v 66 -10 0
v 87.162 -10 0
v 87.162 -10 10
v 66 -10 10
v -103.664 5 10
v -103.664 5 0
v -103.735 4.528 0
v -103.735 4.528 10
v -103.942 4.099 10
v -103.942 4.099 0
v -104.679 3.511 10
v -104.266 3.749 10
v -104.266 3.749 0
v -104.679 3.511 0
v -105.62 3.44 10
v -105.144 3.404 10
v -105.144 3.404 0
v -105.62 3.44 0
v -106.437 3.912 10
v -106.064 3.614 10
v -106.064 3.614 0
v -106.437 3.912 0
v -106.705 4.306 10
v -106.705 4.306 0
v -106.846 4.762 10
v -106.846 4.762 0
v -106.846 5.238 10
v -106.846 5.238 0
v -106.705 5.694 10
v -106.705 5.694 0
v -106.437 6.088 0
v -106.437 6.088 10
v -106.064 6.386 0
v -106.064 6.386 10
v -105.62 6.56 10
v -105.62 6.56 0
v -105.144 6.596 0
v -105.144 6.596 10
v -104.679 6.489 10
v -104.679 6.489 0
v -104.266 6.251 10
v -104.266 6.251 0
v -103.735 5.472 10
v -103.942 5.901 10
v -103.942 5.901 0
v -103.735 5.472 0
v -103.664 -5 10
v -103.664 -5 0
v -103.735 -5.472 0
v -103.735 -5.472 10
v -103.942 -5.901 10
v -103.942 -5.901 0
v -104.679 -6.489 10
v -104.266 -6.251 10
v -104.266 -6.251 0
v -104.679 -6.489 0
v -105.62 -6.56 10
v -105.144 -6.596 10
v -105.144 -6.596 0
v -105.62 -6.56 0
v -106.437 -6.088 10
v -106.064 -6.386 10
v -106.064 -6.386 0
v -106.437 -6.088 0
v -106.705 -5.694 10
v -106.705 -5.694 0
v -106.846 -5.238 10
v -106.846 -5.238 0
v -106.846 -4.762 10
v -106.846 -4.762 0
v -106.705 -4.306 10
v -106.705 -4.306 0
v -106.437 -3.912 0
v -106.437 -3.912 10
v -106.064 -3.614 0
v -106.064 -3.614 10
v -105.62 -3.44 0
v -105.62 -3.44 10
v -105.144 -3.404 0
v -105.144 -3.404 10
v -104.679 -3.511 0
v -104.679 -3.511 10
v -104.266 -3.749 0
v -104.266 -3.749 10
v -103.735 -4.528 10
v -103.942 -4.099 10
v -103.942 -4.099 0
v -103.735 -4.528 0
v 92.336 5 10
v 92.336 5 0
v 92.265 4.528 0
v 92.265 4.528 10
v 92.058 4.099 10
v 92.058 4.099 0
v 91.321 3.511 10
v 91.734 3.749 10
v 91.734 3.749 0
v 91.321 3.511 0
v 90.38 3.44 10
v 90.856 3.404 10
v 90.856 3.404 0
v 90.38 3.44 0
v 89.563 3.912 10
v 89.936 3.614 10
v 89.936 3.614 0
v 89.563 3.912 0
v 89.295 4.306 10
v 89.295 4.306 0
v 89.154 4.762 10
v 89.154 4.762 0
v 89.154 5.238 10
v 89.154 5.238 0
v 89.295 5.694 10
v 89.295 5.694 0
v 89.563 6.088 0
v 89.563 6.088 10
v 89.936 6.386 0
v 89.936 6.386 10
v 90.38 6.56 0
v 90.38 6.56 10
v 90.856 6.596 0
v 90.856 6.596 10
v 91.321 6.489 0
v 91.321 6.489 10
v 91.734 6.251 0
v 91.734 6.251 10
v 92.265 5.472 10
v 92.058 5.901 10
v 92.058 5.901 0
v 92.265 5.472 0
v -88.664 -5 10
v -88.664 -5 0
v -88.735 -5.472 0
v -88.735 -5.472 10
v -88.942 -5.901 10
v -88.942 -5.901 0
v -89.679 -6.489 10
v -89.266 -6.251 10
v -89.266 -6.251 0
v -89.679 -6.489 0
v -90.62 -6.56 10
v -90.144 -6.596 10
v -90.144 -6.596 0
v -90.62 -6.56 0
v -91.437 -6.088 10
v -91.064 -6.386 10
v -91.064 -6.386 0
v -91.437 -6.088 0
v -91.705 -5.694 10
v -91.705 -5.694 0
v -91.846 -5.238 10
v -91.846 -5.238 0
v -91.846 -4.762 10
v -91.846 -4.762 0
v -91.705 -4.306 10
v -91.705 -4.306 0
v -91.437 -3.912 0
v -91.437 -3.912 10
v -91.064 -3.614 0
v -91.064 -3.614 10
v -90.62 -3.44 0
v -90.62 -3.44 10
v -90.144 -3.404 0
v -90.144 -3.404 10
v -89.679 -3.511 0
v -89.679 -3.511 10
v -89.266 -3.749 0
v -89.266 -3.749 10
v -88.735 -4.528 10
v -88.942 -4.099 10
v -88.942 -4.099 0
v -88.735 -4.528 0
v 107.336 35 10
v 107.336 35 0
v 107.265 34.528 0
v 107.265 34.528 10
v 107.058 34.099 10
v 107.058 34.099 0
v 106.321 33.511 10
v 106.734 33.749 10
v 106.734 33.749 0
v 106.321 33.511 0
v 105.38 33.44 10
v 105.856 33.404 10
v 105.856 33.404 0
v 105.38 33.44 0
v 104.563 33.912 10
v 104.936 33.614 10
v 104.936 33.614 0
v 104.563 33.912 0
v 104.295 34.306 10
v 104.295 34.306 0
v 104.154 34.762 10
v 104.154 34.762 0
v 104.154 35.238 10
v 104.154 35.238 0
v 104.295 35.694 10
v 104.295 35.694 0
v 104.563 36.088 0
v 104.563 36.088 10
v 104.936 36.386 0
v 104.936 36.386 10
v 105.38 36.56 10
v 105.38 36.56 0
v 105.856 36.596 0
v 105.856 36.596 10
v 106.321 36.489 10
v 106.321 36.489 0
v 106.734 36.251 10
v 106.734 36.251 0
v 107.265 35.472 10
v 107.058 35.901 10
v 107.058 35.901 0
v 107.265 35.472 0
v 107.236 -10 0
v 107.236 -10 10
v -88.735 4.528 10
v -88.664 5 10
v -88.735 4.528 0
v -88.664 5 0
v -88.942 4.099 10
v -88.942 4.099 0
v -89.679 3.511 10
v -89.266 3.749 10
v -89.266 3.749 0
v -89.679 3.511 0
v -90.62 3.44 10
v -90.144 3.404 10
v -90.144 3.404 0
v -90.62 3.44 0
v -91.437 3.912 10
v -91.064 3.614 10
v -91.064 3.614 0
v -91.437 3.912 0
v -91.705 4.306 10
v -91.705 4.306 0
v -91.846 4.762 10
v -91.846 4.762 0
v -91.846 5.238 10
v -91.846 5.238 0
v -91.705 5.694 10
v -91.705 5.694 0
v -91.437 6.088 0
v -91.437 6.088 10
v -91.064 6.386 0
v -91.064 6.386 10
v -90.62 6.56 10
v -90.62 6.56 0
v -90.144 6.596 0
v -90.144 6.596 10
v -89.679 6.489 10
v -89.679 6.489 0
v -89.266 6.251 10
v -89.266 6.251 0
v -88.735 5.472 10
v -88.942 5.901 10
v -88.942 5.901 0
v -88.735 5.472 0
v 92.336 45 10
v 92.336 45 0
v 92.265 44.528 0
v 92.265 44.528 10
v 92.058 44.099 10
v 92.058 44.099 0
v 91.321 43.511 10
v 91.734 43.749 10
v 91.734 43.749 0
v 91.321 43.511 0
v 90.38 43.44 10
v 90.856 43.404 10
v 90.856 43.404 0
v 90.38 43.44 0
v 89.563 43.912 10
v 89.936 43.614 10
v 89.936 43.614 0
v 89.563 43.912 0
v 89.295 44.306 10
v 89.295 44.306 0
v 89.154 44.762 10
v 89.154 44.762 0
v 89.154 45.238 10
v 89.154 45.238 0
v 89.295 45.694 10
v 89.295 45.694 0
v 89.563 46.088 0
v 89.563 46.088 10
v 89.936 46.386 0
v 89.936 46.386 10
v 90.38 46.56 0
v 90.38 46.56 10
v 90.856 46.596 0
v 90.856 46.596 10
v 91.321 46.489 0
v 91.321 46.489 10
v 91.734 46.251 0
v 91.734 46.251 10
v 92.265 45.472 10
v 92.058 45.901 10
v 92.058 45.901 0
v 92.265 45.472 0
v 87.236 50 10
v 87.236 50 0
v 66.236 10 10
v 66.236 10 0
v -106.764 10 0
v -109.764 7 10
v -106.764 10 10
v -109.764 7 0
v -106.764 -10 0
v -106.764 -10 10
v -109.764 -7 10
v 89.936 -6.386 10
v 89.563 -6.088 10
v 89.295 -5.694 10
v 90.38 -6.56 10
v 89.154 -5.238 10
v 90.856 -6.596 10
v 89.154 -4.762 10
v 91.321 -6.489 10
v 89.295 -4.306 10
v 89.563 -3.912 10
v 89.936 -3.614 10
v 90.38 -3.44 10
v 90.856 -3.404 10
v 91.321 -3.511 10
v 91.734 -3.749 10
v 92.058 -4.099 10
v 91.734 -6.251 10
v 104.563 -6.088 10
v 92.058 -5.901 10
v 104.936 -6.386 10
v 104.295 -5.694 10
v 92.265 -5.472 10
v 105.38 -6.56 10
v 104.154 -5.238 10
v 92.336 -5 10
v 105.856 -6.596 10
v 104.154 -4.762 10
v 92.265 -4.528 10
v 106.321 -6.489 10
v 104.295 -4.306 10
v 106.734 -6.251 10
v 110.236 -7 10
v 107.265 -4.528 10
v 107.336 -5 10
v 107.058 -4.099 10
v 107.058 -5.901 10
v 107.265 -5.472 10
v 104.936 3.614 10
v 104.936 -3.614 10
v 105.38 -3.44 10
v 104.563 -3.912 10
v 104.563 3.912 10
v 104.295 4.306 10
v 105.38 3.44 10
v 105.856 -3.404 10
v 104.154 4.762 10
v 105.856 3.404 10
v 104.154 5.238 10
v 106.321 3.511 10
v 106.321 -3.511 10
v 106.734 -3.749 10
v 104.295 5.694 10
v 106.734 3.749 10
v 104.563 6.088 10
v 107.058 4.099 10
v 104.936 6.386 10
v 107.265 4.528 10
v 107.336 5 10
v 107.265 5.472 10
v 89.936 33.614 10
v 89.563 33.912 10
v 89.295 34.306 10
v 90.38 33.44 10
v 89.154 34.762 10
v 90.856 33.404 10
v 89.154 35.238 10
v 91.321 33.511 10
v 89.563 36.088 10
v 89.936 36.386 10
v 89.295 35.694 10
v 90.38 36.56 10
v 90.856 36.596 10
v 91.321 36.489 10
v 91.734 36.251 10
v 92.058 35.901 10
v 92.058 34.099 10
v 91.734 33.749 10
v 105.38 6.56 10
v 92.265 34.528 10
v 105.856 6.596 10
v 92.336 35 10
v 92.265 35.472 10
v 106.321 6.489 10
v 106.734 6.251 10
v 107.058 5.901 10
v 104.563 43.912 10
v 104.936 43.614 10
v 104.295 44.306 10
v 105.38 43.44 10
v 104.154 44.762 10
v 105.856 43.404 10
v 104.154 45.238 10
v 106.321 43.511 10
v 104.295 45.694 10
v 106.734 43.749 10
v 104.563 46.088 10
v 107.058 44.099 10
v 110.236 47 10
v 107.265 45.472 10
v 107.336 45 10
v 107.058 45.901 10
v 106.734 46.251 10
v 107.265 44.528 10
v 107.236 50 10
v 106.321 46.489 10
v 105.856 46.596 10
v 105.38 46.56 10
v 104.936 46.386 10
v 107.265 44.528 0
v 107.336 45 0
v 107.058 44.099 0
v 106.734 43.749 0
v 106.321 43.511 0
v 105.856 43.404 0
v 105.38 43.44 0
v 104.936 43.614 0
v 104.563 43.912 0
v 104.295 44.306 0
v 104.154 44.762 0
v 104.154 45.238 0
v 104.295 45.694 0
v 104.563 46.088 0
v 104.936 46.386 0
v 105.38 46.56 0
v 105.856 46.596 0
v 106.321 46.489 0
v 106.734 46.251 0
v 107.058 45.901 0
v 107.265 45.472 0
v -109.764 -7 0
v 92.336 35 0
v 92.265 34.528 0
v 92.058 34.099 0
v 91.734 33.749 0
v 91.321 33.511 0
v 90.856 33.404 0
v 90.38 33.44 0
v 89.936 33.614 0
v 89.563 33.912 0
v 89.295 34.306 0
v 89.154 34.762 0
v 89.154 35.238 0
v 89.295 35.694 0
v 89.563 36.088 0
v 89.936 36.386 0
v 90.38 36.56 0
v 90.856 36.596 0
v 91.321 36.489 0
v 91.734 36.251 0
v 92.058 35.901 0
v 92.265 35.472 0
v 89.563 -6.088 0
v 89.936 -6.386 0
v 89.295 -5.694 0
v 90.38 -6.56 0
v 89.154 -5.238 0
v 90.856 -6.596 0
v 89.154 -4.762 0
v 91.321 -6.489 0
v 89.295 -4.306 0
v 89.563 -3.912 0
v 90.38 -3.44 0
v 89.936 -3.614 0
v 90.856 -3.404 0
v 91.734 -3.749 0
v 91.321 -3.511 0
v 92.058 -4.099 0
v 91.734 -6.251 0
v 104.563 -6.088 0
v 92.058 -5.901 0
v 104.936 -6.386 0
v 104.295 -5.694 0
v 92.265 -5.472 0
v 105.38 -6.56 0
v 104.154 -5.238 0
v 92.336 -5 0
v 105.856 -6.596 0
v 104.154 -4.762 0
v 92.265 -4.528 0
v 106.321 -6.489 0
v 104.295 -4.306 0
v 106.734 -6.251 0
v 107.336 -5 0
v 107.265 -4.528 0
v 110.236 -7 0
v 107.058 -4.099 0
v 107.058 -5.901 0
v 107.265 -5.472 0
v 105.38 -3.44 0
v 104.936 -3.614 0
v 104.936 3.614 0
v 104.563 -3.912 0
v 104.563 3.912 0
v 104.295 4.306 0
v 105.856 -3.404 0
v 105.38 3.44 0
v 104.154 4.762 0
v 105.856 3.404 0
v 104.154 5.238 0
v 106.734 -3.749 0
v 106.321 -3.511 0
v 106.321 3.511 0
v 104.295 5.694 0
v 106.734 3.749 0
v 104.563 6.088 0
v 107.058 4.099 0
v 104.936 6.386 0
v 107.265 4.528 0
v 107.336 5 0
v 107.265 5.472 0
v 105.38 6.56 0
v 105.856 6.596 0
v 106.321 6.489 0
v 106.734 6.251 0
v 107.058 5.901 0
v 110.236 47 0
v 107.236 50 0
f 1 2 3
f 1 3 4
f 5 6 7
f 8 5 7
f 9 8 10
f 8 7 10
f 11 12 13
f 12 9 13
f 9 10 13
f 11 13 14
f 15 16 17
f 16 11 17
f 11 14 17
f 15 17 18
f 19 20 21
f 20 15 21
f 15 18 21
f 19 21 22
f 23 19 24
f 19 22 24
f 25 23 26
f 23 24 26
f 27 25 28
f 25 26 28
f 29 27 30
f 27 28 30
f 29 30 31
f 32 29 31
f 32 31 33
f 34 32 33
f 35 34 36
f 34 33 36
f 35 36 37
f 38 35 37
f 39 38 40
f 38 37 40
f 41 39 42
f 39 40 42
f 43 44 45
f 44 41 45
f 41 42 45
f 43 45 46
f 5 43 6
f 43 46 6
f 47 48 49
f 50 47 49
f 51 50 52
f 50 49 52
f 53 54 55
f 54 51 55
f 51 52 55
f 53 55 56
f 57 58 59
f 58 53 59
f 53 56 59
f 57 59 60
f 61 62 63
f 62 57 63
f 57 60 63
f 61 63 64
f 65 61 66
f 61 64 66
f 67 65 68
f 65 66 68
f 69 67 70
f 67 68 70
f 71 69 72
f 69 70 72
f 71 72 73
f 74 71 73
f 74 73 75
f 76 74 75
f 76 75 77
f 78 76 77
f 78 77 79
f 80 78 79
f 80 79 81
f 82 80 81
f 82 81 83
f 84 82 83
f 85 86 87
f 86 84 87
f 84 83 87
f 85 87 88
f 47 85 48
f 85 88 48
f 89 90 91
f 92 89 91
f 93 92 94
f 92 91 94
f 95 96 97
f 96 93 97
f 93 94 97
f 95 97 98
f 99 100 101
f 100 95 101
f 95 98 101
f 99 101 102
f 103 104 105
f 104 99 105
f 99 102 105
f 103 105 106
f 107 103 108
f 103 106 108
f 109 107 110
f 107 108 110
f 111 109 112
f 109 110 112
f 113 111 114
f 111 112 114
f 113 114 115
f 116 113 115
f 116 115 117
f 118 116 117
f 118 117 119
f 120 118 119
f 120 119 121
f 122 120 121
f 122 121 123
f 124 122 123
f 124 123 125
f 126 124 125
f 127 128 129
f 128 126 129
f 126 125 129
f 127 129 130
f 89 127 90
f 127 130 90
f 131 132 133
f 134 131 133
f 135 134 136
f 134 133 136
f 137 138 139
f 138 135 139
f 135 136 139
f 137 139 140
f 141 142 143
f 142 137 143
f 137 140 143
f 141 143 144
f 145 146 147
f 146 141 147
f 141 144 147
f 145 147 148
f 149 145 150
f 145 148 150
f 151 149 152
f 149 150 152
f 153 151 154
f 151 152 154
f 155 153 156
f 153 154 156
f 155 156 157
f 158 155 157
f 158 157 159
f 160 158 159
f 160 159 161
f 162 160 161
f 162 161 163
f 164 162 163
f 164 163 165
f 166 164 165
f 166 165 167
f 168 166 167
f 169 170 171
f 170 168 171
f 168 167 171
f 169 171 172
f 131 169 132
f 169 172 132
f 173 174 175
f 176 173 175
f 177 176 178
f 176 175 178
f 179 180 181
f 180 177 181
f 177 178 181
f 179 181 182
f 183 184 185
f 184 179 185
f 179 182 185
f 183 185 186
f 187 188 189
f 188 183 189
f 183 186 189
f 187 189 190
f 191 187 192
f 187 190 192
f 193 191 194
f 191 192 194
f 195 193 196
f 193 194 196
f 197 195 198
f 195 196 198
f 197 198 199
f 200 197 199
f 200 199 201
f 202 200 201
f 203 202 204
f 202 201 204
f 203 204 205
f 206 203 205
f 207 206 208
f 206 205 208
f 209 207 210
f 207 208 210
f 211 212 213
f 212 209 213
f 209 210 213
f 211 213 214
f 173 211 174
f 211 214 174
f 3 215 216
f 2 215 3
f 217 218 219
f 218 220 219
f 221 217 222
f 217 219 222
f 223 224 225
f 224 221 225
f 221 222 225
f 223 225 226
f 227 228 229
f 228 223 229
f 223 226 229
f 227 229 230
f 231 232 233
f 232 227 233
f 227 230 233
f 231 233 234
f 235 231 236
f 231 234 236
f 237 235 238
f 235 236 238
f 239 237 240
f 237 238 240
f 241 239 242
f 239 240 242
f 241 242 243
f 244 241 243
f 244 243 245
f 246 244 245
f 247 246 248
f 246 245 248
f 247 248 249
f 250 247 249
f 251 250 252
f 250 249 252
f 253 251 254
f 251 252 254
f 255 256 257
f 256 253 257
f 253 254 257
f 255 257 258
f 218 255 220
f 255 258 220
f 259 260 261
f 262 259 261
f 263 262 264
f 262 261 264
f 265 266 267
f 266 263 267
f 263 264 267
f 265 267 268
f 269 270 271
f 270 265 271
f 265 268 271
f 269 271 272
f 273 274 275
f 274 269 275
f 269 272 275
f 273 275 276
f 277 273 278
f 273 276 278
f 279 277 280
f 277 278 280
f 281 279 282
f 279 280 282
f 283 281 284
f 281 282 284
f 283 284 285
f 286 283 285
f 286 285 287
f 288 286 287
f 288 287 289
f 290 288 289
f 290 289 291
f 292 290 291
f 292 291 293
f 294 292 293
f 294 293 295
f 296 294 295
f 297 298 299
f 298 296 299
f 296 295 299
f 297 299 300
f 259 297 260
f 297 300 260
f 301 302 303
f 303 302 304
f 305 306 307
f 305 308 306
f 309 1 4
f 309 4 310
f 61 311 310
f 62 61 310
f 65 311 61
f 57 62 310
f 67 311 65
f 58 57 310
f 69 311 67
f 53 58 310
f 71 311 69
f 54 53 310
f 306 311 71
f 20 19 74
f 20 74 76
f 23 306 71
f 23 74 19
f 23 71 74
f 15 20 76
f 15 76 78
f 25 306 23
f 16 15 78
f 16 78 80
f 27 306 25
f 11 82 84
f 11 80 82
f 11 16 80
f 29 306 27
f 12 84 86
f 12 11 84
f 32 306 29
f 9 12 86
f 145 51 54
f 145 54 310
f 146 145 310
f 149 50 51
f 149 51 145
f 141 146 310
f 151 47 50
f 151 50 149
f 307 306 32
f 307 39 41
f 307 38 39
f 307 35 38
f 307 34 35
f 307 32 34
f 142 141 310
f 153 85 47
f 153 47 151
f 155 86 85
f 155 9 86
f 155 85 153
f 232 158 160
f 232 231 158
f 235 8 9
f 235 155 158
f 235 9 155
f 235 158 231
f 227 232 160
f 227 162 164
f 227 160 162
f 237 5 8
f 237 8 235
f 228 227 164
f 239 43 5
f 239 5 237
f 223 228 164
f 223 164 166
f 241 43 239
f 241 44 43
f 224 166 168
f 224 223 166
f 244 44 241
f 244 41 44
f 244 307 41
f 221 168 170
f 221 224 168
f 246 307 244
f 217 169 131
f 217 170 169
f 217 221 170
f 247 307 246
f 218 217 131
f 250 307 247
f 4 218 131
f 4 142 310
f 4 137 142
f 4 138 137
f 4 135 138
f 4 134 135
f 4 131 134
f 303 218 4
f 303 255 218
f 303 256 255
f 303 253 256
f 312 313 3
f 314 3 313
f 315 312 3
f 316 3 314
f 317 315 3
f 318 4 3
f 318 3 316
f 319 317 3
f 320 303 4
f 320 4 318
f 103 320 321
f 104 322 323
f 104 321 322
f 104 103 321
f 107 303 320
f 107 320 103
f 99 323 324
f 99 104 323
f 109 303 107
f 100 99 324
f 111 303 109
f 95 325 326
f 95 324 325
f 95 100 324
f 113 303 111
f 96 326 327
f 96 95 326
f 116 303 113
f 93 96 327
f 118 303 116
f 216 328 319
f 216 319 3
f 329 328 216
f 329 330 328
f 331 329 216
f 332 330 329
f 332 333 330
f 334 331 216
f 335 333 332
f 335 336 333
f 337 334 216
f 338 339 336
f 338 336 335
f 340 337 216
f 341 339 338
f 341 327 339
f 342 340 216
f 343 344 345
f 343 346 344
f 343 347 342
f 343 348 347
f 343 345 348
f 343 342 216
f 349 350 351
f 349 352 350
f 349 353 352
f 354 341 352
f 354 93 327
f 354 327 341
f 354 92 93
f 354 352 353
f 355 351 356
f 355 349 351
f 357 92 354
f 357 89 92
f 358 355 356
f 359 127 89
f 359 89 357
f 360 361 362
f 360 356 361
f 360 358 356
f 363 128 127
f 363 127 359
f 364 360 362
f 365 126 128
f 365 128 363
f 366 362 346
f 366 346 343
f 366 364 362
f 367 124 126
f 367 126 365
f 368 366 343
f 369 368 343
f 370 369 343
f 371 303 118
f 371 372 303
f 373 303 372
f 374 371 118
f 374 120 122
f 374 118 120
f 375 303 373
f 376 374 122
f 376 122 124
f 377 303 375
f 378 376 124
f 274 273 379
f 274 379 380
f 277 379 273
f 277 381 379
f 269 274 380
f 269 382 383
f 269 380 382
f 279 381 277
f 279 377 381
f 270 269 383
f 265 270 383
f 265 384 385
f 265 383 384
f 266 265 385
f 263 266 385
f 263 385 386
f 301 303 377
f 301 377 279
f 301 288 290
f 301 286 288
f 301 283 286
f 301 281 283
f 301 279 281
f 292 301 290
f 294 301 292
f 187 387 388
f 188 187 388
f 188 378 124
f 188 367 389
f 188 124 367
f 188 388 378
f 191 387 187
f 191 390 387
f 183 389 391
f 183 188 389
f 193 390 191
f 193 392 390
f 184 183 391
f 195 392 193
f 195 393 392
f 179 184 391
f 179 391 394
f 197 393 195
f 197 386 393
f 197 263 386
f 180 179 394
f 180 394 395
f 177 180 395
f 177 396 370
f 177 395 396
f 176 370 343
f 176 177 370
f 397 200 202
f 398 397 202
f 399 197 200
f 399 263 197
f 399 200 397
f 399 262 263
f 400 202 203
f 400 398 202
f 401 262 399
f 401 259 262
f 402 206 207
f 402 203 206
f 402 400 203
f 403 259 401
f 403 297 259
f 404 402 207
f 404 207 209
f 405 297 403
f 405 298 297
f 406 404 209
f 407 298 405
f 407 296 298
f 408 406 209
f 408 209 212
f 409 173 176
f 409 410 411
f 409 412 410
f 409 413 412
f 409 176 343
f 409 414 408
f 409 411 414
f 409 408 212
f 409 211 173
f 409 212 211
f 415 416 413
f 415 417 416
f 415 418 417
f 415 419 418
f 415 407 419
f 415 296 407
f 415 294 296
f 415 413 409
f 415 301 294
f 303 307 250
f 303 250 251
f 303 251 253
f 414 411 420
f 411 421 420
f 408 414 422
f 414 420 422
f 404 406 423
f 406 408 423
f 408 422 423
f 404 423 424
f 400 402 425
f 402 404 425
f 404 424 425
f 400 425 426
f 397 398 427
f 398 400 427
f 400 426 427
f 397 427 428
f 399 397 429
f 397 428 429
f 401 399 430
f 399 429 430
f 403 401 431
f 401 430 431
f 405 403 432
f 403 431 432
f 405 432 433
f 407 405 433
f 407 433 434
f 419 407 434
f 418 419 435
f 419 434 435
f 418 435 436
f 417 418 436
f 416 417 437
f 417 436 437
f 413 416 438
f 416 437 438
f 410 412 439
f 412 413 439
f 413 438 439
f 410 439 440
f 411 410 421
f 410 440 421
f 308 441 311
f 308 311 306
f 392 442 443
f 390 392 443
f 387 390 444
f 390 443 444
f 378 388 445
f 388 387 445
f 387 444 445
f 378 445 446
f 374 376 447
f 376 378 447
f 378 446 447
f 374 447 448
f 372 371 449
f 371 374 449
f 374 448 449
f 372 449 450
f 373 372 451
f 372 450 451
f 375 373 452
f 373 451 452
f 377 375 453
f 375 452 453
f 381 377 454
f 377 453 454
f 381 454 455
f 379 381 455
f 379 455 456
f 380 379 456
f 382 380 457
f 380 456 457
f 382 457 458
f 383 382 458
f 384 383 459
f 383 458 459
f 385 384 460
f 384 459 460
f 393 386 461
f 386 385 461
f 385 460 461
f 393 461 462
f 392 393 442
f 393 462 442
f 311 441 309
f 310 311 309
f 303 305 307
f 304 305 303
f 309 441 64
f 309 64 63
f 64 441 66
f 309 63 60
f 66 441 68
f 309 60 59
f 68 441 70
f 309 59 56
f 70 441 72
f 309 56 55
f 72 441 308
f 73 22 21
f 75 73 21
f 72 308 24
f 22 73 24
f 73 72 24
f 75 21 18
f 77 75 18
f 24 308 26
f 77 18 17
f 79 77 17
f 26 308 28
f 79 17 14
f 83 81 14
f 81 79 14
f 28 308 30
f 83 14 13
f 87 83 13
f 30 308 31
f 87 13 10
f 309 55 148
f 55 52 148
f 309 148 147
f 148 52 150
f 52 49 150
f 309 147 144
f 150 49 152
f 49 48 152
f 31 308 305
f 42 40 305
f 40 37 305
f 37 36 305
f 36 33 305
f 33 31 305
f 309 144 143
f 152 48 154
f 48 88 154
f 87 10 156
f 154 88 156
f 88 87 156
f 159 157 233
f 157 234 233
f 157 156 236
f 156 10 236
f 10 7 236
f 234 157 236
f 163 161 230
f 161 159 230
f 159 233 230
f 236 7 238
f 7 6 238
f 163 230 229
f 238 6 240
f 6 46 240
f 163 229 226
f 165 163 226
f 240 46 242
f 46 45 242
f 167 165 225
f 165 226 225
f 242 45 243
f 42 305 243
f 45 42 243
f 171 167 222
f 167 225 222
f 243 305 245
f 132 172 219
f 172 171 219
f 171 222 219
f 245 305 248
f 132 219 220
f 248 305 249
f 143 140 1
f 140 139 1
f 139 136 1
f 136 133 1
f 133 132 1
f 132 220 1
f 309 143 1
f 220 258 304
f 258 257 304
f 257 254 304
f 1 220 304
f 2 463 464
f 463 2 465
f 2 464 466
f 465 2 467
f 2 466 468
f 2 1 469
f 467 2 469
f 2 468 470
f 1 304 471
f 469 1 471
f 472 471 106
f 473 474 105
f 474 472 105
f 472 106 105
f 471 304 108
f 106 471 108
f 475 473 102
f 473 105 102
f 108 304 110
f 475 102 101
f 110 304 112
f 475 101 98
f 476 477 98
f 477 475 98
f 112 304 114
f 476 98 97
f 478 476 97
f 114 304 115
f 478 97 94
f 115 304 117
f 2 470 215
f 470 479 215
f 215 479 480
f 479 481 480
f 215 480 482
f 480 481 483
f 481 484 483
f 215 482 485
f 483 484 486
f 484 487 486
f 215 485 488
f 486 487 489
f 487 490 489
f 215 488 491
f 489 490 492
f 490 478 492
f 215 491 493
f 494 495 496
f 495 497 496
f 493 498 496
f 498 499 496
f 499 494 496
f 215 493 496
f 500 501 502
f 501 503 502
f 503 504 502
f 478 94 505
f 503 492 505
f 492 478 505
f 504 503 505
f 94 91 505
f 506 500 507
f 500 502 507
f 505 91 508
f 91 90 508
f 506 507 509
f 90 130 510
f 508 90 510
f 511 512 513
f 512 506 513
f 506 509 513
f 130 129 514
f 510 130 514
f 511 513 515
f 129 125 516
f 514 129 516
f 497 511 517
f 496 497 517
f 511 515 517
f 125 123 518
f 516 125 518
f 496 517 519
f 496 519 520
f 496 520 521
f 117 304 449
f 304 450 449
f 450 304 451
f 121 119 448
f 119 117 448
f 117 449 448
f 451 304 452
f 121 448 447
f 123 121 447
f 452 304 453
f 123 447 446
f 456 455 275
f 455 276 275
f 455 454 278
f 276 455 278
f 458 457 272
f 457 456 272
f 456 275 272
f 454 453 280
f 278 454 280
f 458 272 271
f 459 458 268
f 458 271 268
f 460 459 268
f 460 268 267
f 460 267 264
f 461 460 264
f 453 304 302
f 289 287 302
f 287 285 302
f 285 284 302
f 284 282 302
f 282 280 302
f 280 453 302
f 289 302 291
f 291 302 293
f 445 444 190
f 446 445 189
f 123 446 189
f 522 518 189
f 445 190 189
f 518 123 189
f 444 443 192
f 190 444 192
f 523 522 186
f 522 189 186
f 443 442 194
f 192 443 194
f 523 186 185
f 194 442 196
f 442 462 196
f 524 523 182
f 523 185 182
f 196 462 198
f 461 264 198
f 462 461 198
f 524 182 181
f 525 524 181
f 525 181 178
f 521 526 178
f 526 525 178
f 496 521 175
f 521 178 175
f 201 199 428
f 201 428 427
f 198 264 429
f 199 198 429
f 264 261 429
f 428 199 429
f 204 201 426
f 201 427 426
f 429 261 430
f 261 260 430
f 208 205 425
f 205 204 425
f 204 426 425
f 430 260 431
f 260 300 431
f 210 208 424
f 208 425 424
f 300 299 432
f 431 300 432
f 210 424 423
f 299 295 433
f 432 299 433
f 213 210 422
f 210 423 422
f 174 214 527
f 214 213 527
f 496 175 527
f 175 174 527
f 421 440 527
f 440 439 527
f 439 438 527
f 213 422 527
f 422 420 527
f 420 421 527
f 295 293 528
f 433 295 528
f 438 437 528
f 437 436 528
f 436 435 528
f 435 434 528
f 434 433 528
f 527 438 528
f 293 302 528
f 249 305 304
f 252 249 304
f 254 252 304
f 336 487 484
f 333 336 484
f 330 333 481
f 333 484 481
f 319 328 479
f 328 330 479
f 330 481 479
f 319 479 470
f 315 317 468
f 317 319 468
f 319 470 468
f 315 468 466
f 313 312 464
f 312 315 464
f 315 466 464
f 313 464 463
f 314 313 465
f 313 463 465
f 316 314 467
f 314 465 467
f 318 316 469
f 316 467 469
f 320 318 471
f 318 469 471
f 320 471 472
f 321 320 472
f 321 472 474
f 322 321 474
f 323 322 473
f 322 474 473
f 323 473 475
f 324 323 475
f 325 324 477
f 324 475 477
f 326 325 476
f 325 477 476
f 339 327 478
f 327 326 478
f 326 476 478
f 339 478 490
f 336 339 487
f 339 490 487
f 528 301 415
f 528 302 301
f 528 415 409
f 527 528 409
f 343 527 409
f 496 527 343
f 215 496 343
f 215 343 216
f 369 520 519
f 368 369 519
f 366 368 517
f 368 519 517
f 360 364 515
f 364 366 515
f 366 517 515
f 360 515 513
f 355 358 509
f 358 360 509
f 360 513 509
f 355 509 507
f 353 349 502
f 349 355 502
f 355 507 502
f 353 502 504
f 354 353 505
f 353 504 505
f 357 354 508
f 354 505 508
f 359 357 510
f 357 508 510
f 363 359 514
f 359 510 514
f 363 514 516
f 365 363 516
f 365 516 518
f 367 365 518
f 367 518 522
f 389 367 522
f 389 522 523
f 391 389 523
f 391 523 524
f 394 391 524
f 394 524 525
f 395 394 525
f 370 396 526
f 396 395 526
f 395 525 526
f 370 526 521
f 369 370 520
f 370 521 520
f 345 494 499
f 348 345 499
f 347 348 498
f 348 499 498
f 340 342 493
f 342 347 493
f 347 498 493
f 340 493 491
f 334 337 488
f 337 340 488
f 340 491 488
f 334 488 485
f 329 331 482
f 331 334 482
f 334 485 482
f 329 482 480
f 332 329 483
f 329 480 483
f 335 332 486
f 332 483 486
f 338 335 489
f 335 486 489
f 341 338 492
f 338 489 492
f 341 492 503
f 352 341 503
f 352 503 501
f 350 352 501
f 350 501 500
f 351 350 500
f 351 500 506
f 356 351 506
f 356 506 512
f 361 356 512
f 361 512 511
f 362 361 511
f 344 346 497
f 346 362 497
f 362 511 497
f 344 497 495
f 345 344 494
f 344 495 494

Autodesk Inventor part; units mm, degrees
ref_plane "YZ Plane" through (0, 0, 0) normal (1, 0, 0) x (0, 1, 0)
ref_plane "XZ Plane" through (0, 0, 0) normal (0, 1, 0) x (-1, 0, 0)
ref_plane "XY Plane" through (0, 0, 0) normal (0, 0, 1) x (1, 0, 0)
sketch "Sketch1" plane through (0, 0, 0) normal (0, 0, 1) x (1, 0, 0)
  line L0 (-109.7639, -7) -> (-109.7639, 7)
  line L1 (-105.2639, 5) -> (-90.2639, 5) construction
  line L2 (-90.2639, 5) -> (-90.2639, -5) construction
  line L3 (-90.2639, -5) -> (-105.2639, -5) construction
  line L4 (-105.2639, -5) -> (-105.2639, 5) construction
  line L5 (-105.2639, 5) -> (-90.2639, -5) construction
  line L6 (-90.2639, 5) -> (-105.2639, -5) construction
  circle A0 centre (-105.2639, 5) radius 1.6
  circle A1 centre (-90.2639, 5) radius 1.6
  circle A2 centre (-105.2639, -5) radius 1.6
  circle A3 centre (-90.2639, -5) radius 1.6
  circle A4 centre (90.7361, 45) radius 1.6
  circle A5 centre (105.7361, 45) radius 1.6
  circle A6 centre (90.7361, 35) radius 1.6
  circle A7 centre (105.7361, 35) radius 1.6
  line L7 (-109.7639, 7) -> (-106.7639, 10)
  line L8 (-109.7639, -7) -> (-106.7639, -10)
  line L9 (87.2361, 50) -> (107.2361, 50)
  line L10 (110.2361, 47) -> (110.2361, -7)
  line L11 (107.2361, -10) -> (87.1625, -10)
  circle A8 centre (105.7361, -5) radius 1.6
  circle A9 centre (105.7361, 5) radius 1.6
  circle A10 centre (90.7361, -5) radius 1.6
  circle A11 centre (90.7361, 5) radius 1.6
  line L12 (90.7361, 45) -> (105.7361, 45) construction
  line L13 (105.7361, 35) -> (105.7361, 5) construction
  line L14 (107.2361, 50) -> (110.2361, 47)
  line L15 (110.2361, -7) -> (107.2361, -10)
  line L16 (87.2361, 50) -> (66.2361, 10)
  line L17 (87.1625, -10) -> (66, -10)
  line L18 (-106.7639, 10) -> (66.2361, 10)
  line L19 (66, -10) -> (-106.7639, -10)
  point P0 (0, 0)
  point P1 (0.2361, 0)
  point P2 (98.4723, 19.4096)
  point P3 (-97.7639, 0)
  point P4 (0.2361, 0)
  point P5 (98.2361, 45)
  point P6 (105.7361, 20)
  point P7 (98.2361, 20)
  dimension "d4" = 15
  dimension "d5" = 10
  dimension "d6" = 12
  dimension "d8" = 3.2
  dimension "d20" = 15
  dimension "d21" = 10
  dimension "d22" = 15
  dimension "d23" = 10
  dimension "d24" = 30
  dimension "d31" = 4.5
  dimension "d32" = 5
  dimension "d34" = 220
  dimension "d35" = 3
  dimension "d36" = 3
  dimension "d37" = 3
  dimension "d38" = 3
  dimension "d39" = 20
extrude "Extrusion1" add sketch "Sketch1" along normal blind 10
sketch "Sketch3" plane through (0, 0, 10) normal (0, 0, 1) x (1, 0, 0)
  point P0 (0, 0)
properties part number "HorizontalBridge"
